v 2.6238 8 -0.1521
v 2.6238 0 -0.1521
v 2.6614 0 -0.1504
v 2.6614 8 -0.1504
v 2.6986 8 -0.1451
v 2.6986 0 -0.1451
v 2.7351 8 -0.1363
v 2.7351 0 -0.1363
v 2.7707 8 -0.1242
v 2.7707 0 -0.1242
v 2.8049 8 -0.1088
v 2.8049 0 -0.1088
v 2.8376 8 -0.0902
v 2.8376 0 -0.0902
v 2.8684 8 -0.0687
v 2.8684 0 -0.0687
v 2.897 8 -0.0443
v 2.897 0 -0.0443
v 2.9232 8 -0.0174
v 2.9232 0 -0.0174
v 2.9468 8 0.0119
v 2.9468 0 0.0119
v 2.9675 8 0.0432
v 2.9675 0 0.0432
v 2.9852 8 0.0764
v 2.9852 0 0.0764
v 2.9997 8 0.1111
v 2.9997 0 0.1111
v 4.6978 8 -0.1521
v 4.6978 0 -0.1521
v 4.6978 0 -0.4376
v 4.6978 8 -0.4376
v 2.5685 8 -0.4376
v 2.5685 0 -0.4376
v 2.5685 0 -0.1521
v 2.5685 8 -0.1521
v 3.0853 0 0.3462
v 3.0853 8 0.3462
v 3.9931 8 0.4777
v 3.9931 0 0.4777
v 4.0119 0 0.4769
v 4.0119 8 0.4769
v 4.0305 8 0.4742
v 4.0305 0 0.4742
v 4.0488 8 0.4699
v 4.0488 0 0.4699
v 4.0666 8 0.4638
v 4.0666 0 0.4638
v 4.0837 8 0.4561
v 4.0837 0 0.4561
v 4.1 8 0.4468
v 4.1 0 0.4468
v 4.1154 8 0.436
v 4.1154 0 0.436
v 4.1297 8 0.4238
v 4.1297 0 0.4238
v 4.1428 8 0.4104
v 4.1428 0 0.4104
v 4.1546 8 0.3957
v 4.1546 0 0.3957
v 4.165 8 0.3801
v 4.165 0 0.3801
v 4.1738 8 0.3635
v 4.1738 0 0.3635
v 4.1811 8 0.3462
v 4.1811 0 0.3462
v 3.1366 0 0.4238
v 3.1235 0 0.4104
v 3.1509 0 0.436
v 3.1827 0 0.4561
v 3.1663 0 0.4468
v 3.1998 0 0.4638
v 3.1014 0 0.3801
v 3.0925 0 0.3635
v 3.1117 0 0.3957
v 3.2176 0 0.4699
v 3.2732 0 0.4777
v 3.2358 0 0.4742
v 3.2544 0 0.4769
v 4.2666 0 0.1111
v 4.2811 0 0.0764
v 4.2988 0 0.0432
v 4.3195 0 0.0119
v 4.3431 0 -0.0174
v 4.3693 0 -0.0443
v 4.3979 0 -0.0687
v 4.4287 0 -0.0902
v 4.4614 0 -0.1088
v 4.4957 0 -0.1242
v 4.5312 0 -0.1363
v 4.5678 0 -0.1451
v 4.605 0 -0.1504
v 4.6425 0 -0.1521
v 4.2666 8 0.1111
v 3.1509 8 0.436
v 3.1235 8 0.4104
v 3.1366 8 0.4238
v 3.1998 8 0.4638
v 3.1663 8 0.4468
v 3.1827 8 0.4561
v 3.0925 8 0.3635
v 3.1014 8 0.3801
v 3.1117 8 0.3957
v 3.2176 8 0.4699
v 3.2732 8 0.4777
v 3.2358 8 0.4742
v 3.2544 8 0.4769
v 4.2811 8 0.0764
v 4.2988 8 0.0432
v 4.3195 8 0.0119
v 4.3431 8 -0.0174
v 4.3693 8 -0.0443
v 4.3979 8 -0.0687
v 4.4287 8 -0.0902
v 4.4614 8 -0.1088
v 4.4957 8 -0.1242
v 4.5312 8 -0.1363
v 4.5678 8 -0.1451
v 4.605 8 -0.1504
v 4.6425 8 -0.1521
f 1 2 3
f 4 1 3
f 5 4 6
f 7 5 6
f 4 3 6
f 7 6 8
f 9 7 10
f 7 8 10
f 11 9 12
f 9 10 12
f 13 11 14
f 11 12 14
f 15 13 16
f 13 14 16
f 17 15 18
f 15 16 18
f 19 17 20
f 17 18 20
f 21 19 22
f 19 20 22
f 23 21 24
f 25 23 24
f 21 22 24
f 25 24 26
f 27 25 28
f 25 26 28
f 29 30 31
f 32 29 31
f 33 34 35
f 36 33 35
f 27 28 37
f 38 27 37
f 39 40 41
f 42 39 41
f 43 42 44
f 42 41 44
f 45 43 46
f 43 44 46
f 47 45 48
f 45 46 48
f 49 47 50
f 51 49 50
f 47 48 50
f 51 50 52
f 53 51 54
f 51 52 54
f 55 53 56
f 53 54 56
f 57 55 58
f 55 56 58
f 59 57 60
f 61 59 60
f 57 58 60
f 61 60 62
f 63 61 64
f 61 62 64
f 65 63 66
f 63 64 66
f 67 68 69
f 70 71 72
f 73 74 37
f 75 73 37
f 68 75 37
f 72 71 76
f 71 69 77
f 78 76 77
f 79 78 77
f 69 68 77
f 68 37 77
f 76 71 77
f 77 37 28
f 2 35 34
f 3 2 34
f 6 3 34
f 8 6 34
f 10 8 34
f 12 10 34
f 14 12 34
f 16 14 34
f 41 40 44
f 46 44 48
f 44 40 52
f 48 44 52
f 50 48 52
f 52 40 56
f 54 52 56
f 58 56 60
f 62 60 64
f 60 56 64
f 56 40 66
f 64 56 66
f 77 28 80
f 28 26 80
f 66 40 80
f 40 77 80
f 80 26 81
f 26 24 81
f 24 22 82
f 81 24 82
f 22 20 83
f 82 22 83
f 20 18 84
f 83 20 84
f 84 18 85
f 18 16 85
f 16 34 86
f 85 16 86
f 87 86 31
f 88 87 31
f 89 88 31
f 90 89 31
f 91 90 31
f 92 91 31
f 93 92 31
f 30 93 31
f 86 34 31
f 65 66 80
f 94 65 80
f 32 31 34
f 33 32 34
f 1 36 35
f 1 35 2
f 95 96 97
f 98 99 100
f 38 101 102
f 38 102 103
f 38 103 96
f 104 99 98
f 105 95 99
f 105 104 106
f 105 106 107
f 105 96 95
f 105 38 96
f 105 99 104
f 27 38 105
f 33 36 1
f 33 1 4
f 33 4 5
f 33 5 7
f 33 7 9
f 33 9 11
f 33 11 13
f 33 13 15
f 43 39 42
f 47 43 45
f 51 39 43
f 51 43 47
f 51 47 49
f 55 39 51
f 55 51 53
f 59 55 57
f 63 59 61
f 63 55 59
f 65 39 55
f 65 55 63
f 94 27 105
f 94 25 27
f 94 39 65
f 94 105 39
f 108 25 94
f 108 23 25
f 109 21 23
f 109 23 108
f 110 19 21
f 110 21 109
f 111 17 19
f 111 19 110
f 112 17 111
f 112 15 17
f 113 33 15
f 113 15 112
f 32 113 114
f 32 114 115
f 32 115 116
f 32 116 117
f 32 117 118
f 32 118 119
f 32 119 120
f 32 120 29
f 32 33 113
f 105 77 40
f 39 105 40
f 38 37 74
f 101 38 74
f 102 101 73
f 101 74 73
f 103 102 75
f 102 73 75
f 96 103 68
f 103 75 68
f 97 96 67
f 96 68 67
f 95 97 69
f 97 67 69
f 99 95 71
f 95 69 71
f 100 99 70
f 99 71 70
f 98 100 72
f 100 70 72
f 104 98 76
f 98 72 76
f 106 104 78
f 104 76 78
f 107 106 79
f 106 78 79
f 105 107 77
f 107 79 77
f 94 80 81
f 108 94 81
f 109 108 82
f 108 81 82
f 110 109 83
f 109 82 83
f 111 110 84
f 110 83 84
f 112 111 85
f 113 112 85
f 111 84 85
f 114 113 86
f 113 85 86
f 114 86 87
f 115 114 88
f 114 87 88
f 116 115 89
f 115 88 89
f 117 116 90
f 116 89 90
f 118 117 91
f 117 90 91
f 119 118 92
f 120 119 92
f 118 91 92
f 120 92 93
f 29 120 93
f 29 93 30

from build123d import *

# Parameters (mm, degrees)
EXTRUDE_1_DEPTH = 8


with BuildPart() as part:
    # 草图1 → 凸台-拉伸1 (new body)
    with BuildSketch(Plane(origin=(0, 0, 0), x_dir=(1, 0, 0), z_dir=(0, 1, 0))):
        with BuildLine():
            Line((4.181064308, -0.346153929), (4.266632429, -0.111057449))
            ThreePointArc((4.266632429, -0.111057449), (4.413078903, 0.079795311), (4.642509478, 0.152134494))
            Line((4.642509478, 0.152134494), (4.697815899, 0.152134494))
            Line((4.697815899, 0.152134494), (4.697815899, 0.43758725))
            Line((4.697815899, 0.43758725), (2.568518685, 0.43758725))
            Line((2.568518685, 0.43758725), (2.568518685, 0.152134494))
            Line((2.568518685, 0.152134494), (2.623825106, 0.152134494))
            ThreePointArc((2.623825106, 0.152134494), (2.853255681, 0.079795311), (2.999702154, -0.111057449))
            Line((2.999702154, -0.111057449), (3.085270275, -0.346153929))
            ThreePointArc((3.085270275, -0.346153929), (3.158493512, -0.441580309), (3.273208799, -0.477749901))
            Line((3.273208799, -0.477749901), (3.993125784, -0.477749901))
            ThreePointArc((3.993125784, -0.477749901), (4.107841071, -0.441580309), (4.181064308, -0.346153929))
        make_face()
    extrude(amount=EXTRUDE_1_DEPTH)


solid = part.part
